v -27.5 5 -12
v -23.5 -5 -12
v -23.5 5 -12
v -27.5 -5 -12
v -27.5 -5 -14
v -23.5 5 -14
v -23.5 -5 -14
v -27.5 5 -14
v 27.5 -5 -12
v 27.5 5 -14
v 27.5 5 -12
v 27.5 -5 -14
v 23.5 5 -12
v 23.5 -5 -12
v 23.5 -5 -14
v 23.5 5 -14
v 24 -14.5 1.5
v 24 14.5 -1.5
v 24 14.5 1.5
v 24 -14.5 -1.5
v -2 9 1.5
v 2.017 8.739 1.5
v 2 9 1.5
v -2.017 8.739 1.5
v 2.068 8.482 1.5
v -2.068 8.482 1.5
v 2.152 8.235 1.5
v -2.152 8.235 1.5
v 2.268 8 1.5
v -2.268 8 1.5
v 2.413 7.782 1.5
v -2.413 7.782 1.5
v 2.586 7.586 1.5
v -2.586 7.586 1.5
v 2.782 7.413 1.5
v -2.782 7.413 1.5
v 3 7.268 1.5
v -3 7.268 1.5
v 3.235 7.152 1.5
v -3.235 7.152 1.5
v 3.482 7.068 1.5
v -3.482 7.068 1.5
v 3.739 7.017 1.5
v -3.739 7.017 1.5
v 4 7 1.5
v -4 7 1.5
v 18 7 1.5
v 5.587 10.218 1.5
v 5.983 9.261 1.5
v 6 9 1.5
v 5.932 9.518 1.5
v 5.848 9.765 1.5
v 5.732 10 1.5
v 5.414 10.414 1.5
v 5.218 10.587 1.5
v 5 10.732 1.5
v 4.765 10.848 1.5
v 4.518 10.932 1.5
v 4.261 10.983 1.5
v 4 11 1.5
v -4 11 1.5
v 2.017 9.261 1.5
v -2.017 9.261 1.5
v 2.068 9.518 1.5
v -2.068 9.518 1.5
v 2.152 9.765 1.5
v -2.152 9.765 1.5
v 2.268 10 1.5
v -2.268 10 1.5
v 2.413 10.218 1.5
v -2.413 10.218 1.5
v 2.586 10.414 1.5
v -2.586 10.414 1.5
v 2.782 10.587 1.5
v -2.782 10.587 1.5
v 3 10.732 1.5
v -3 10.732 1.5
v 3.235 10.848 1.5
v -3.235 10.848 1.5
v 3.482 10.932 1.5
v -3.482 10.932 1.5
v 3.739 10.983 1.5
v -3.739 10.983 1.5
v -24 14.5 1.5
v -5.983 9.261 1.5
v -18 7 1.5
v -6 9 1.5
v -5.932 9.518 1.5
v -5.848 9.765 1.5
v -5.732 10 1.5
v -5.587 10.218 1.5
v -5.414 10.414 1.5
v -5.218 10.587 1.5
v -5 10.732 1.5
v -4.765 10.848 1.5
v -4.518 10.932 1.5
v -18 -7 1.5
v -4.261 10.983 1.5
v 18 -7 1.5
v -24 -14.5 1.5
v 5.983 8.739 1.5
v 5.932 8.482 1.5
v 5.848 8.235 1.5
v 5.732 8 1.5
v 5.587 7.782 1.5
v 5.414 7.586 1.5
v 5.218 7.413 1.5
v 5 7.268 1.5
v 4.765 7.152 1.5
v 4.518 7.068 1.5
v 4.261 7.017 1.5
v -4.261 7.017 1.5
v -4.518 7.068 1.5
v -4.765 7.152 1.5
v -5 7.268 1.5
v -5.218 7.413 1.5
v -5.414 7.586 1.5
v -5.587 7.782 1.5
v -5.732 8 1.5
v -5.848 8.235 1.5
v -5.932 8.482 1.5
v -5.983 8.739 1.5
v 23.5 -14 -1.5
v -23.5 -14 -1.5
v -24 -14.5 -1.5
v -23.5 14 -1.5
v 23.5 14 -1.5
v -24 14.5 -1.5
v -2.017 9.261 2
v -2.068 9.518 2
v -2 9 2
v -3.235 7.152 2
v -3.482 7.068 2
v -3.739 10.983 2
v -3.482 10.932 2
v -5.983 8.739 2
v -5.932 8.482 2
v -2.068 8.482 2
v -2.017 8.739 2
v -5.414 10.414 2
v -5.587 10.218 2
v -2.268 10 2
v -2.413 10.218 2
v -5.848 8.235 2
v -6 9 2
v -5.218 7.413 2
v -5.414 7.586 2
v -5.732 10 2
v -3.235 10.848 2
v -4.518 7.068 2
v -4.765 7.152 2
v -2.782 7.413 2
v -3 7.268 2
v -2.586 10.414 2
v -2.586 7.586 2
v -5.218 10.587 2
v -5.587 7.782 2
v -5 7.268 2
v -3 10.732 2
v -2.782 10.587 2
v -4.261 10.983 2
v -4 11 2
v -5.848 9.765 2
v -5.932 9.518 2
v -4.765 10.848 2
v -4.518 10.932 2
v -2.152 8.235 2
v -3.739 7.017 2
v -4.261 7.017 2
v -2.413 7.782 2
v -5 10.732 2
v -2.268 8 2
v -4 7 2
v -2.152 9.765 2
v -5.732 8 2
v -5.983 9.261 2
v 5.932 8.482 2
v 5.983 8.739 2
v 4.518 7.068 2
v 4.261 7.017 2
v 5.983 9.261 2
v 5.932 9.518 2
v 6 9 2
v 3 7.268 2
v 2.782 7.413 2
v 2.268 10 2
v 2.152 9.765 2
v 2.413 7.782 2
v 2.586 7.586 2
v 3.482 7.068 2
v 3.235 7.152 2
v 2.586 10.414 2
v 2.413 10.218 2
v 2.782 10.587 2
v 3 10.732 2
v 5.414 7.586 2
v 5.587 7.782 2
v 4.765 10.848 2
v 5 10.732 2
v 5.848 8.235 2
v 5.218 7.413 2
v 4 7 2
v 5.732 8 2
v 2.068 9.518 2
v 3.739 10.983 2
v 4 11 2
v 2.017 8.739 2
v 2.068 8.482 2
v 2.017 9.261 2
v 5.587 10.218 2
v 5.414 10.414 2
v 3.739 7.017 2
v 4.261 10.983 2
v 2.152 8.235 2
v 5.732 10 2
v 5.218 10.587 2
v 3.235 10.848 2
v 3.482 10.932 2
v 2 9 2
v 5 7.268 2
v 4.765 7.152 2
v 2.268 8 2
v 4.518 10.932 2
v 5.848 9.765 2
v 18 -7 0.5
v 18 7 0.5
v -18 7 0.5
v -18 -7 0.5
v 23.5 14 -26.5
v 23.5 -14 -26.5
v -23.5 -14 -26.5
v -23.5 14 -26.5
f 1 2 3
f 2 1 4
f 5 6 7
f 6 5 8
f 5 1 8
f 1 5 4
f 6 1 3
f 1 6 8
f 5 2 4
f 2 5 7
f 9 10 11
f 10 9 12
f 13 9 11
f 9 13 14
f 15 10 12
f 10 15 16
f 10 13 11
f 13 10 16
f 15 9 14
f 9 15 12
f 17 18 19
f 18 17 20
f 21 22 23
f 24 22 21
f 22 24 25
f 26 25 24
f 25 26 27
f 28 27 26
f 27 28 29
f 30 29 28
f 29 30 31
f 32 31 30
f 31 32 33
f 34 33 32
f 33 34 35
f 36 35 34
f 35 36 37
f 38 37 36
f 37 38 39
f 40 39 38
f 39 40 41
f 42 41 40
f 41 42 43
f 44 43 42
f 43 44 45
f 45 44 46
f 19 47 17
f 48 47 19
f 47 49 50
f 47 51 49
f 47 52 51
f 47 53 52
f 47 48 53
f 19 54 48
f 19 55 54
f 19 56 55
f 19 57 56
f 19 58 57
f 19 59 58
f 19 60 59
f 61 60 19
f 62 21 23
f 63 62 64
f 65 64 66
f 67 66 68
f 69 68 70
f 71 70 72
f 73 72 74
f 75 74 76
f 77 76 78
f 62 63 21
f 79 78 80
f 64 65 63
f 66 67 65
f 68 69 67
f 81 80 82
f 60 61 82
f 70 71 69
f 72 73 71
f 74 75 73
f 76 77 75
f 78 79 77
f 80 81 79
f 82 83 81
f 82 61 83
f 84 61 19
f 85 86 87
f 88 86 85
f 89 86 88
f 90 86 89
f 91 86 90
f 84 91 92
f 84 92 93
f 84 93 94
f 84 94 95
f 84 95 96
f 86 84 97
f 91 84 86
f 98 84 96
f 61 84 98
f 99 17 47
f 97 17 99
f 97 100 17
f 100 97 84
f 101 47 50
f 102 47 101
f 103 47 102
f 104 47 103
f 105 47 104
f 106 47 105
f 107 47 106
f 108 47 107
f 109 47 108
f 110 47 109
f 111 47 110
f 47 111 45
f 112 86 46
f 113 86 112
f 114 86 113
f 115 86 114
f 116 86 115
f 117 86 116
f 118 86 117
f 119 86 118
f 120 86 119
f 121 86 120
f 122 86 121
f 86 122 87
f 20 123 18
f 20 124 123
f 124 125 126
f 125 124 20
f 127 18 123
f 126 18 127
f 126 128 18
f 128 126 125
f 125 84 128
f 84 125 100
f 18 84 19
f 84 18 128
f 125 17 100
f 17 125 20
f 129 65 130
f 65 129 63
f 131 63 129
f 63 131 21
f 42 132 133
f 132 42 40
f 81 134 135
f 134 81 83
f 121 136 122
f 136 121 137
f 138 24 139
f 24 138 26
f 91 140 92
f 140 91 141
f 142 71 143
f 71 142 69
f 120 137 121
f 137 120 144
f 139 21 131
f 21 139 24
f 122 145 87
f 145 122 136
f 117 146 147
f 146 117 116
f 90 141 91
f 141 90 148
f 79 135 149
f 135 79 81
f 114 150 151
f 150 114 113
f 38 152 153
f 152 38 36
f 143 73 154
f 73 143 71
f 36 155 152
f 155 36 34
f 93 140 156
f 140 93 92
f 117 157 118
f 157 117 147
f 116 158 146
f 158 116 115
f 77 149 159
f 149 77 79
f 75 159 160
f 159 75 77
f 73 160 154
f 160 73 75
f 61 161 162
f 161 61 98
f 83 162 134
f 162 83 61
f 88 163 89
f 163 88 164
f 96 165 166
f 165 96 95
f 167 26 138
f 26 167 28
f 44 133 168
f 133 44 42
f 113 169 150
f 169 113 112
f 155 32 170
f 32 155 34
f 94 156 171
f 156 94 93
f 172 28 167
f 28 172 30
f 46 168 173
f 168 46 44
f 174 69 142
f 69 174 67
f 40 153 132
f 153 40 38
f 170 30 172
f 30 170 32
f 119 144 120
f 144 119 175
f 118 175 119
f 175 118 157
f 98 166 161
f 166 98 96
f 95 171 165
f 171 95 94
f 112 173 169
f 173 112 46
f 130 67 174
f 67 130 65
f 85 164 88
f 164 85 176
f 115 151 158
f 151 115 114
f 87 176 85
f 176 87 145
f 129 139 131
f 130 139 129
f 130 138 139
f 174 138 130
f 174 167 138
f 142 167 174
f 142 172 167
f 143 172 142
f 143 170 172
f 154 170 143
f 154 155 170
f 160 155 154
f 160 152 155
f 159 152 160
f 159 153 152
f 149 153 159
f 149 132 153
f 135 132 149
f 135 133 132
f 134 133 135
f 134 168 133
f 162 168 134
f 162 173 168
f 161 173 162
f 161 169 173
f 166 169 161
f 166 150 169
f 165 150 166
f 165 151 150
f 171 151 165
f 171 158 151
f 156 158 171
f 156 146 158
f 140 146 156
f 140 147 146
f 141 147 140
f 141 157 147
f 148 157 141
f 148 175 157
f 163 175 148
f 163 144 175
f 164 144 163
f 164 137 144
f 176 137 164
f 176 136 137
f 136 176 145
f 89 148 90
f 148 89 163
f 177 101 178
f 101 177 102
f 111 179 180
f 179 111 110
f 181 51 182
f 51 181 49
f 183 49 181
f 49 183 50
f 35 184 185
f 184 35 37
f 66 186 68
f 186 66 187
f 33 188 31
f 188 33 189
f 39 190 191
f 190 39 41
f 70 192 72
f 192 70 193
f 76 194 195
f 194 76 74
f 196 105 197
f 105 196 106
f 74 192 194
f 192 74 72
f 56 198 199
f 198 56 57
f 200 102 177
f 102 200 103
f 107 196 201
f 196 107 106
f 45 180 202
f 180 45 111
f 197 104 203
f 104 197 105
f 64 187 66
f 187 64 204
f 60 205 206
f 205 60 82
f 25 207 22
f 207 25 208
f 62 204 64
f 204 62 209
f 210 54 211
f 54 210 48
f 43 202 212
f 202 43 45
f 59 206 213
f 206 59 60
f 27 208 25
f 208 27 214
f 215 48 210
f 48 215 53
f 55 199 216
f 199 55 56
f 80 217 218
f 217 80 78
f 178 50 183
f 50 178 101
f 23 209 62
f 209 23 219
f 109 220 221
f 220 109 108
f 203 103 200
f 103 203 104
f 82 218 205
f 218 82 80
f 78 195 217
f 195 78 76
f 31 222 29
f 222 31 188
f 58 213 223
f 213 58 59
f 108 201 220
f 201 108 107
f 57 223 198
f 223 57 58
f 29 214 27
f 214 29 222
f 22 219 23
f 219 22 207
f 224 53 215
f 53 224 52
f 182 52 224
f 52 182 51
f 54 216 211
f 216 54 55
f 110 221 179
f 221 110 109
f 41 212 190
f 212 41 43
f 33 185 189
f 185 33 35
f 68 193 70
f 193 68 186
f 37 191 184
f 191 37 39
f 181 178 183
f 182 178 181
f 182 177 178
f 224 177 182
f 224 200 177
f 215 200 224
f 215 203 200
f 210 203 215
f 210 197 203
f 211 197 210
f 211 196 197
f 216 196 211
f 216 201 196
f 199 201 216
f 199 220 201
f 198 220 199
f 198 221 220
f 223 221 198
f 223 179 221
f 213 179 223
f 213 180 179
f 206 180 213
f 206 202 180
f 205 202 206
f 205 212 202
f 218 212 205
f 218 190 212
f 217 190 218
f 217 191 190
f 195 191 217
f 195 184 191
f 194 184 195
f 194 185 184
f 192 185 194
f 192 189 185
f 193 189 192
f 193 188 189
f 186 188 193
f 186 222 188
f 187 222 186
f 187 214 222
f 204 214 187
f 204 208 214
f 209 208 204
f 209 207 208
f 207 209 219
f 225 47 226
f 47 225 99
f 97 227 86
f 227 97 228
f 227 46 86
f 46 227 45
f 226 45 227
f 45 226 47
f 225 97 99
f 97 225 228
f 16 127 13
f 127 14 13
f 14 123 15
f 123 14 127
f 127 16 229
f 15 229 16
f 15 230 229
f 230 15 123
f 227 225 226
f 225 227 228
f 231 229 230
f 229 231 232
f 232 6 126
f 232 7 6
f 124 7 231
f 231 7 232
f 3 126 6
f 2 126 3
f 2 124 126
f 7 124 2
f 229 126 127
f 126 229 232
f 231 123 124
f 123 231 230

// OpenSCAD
// Parameters
tolerance = 0.2; //[0.05:0.6:0.05]
overlap = 1.0; //[0.5:2.0:0.1]
bezel_width = 48; //[30:96:1]
bezel_height = 29; //[18:58:1]
bezel_thickness = 3; //[1.5:6:0.5]
body_width = 45; //[28:90:1]
body_height = 26; //[16:52:1]
body_depth = 25; //[15:60:1]
cutout_width = 45.2; //[28:92:0.1]
cutout_height = 26.2; //[16:60:0.1]
display_window_width = 36; //[20:70:1]
display_window_height = 14; //[8:30:1]
display_window_depth = 2.5; //[1:6:0.5]
tab_enabled = 1; //[0:1:1]
tab_width = 6; //[3:15:0.5]
tab_height = 10; //[5:20:0.5]
tab_thickness = 2; //[1:5:0.5]
button_enabled = 1; //[0:1:1]
button_diameter = 4; //[2:8:0.5]
button_height = 1.5; //[0.8:4:0.1]
button_spacing = 8; //[5:20:0.5]
button_offset_y = 9; //[4:14:0.5]
envelope_clearance = 1.0; //[0.5:5.0:0.5]
pcb_thickness = 1.6; //[0.8:3.2:0.1]
pcb_margin = 1.0; //[0.0:5.0:0.5]
panel_cutout_depth = 6; //[2:20:1]

// Derived Z positions (centered model)
z_bezel = 0;
z_body  = -(bezel_thickness/2 + body_depth/2 - overlap);

// Panel Meter - complete geometry
module panel_meter() {
  color("Black")
  union() {
    // Front Bezel
    translate([0, 0, z_bezel])
      cube([bezel_width, bezel_height, bezel_thickness], center=true);

    // Rear Body (overlaps bezel by 'overlap')
    translate([0, 0, z_body])
      cube([body_width, body_height, body_depth], center=true);

    // Retention Tabs (overlap into body by 'overlap')
    if (tab_enabled) {
      translate([-(body_width/2 + tab_width/2 - overlap), 0, z_body])
        cube([tab_width, tab_height, tab_thickness], center=true);
      translate([(body_width/2 + tab_width/2 - overlap), 0, z_body])
        cube([tab_width, tab_height, tab_thickness], center=true);
    }
  }
}

// Panel Meter Button/Terminals - FIXED: attached to FRONT FACE (not floating/offset)
module panel_meter_button() {
  color("Silver")
  union() {
    if (button_enabled) {

      // Attach to the bezel FRONT face (positive Z), not the top.
      // Bezel front face is at z = +bezel_thickness/2.
      // With center=true cylinder, frontmost point is z_btn + button_height/2.
      // Set cylinder to penetrate bezel by 'overlap':
      // cylinder back face = (bezel_front - overlap) => z_btn - button_height/2 = bezel_front - overlap
      // => z_btn = bezel_front - overlap + button_height/2
      z_btn = (bezel_thickness/2 - overlap + button_height/2);

      // Keep buttons within bezel height; clamp if user sets offset too large
      y_btn = min(bezel_height/2 - button_diameter/2 - tolerance,
                  max(-bezel_height/2 + button_diameter/2 + tolerance, button_offset_y));

      translate([-button_spacing/2, y_btn, z_btn])
        cylinder(d=button_diameter, h=button_height, center=true, $fn=48);

      translate([ button_spacing/2, y_btn, z_btn])
        cylinder(d=button_diameter, h=button_height, center=true, $fn=48);
    }
  }
}

// Panel Meter Cutout - complete geometry (kept separate visual/reference)
module panel_meter_cutout() {
  color("DimGray")
  union() {
    // Panel Cutout Profile
    translate([0, 0, -(bezel_thickness/2 + panel_cutout_depth/2 - overlap)])
      cube([cutout_width, cutout_height, panel_cutout_depth], center=true);

    // Rear Clearance Envelope
    translate([0, 0, z_body])
      cube([body_width + 2*envelope_clearance,
            body_height + 2*envelope_clearance,
            body_depth + 2*envelope_clearance], center=true);

    // PCB Envelope
    translate([0, 0, -(bezel_thickness/2 + body_depth - pcb_thickness/2 - overlap)])
      cube([body_width - 2*(tolerance + pcb_margin),
            body_height - 2*(tolerance + pcb_margin),
            pcb_thickness], center=true);
  }
}

// Assembly
module assembly() {
  // Single connected solid for the meter itself
  difference() {
    union() {
      panel_meter();
      panel_meter_button(); // now overlaps bezel FRONT face by 'overlap' => attached
    }

    // Display Aperture
    translate([0, 0, (bezel_thickness/2 - display_window_depth/2)])
      cube([display_window_width, display_window_height, display_window_depth + overlap*2], center=true);
  }

  // Reference cutout/envelope (not part of the solid meter body)
  panel_meter_cutout();
}

assembly();
